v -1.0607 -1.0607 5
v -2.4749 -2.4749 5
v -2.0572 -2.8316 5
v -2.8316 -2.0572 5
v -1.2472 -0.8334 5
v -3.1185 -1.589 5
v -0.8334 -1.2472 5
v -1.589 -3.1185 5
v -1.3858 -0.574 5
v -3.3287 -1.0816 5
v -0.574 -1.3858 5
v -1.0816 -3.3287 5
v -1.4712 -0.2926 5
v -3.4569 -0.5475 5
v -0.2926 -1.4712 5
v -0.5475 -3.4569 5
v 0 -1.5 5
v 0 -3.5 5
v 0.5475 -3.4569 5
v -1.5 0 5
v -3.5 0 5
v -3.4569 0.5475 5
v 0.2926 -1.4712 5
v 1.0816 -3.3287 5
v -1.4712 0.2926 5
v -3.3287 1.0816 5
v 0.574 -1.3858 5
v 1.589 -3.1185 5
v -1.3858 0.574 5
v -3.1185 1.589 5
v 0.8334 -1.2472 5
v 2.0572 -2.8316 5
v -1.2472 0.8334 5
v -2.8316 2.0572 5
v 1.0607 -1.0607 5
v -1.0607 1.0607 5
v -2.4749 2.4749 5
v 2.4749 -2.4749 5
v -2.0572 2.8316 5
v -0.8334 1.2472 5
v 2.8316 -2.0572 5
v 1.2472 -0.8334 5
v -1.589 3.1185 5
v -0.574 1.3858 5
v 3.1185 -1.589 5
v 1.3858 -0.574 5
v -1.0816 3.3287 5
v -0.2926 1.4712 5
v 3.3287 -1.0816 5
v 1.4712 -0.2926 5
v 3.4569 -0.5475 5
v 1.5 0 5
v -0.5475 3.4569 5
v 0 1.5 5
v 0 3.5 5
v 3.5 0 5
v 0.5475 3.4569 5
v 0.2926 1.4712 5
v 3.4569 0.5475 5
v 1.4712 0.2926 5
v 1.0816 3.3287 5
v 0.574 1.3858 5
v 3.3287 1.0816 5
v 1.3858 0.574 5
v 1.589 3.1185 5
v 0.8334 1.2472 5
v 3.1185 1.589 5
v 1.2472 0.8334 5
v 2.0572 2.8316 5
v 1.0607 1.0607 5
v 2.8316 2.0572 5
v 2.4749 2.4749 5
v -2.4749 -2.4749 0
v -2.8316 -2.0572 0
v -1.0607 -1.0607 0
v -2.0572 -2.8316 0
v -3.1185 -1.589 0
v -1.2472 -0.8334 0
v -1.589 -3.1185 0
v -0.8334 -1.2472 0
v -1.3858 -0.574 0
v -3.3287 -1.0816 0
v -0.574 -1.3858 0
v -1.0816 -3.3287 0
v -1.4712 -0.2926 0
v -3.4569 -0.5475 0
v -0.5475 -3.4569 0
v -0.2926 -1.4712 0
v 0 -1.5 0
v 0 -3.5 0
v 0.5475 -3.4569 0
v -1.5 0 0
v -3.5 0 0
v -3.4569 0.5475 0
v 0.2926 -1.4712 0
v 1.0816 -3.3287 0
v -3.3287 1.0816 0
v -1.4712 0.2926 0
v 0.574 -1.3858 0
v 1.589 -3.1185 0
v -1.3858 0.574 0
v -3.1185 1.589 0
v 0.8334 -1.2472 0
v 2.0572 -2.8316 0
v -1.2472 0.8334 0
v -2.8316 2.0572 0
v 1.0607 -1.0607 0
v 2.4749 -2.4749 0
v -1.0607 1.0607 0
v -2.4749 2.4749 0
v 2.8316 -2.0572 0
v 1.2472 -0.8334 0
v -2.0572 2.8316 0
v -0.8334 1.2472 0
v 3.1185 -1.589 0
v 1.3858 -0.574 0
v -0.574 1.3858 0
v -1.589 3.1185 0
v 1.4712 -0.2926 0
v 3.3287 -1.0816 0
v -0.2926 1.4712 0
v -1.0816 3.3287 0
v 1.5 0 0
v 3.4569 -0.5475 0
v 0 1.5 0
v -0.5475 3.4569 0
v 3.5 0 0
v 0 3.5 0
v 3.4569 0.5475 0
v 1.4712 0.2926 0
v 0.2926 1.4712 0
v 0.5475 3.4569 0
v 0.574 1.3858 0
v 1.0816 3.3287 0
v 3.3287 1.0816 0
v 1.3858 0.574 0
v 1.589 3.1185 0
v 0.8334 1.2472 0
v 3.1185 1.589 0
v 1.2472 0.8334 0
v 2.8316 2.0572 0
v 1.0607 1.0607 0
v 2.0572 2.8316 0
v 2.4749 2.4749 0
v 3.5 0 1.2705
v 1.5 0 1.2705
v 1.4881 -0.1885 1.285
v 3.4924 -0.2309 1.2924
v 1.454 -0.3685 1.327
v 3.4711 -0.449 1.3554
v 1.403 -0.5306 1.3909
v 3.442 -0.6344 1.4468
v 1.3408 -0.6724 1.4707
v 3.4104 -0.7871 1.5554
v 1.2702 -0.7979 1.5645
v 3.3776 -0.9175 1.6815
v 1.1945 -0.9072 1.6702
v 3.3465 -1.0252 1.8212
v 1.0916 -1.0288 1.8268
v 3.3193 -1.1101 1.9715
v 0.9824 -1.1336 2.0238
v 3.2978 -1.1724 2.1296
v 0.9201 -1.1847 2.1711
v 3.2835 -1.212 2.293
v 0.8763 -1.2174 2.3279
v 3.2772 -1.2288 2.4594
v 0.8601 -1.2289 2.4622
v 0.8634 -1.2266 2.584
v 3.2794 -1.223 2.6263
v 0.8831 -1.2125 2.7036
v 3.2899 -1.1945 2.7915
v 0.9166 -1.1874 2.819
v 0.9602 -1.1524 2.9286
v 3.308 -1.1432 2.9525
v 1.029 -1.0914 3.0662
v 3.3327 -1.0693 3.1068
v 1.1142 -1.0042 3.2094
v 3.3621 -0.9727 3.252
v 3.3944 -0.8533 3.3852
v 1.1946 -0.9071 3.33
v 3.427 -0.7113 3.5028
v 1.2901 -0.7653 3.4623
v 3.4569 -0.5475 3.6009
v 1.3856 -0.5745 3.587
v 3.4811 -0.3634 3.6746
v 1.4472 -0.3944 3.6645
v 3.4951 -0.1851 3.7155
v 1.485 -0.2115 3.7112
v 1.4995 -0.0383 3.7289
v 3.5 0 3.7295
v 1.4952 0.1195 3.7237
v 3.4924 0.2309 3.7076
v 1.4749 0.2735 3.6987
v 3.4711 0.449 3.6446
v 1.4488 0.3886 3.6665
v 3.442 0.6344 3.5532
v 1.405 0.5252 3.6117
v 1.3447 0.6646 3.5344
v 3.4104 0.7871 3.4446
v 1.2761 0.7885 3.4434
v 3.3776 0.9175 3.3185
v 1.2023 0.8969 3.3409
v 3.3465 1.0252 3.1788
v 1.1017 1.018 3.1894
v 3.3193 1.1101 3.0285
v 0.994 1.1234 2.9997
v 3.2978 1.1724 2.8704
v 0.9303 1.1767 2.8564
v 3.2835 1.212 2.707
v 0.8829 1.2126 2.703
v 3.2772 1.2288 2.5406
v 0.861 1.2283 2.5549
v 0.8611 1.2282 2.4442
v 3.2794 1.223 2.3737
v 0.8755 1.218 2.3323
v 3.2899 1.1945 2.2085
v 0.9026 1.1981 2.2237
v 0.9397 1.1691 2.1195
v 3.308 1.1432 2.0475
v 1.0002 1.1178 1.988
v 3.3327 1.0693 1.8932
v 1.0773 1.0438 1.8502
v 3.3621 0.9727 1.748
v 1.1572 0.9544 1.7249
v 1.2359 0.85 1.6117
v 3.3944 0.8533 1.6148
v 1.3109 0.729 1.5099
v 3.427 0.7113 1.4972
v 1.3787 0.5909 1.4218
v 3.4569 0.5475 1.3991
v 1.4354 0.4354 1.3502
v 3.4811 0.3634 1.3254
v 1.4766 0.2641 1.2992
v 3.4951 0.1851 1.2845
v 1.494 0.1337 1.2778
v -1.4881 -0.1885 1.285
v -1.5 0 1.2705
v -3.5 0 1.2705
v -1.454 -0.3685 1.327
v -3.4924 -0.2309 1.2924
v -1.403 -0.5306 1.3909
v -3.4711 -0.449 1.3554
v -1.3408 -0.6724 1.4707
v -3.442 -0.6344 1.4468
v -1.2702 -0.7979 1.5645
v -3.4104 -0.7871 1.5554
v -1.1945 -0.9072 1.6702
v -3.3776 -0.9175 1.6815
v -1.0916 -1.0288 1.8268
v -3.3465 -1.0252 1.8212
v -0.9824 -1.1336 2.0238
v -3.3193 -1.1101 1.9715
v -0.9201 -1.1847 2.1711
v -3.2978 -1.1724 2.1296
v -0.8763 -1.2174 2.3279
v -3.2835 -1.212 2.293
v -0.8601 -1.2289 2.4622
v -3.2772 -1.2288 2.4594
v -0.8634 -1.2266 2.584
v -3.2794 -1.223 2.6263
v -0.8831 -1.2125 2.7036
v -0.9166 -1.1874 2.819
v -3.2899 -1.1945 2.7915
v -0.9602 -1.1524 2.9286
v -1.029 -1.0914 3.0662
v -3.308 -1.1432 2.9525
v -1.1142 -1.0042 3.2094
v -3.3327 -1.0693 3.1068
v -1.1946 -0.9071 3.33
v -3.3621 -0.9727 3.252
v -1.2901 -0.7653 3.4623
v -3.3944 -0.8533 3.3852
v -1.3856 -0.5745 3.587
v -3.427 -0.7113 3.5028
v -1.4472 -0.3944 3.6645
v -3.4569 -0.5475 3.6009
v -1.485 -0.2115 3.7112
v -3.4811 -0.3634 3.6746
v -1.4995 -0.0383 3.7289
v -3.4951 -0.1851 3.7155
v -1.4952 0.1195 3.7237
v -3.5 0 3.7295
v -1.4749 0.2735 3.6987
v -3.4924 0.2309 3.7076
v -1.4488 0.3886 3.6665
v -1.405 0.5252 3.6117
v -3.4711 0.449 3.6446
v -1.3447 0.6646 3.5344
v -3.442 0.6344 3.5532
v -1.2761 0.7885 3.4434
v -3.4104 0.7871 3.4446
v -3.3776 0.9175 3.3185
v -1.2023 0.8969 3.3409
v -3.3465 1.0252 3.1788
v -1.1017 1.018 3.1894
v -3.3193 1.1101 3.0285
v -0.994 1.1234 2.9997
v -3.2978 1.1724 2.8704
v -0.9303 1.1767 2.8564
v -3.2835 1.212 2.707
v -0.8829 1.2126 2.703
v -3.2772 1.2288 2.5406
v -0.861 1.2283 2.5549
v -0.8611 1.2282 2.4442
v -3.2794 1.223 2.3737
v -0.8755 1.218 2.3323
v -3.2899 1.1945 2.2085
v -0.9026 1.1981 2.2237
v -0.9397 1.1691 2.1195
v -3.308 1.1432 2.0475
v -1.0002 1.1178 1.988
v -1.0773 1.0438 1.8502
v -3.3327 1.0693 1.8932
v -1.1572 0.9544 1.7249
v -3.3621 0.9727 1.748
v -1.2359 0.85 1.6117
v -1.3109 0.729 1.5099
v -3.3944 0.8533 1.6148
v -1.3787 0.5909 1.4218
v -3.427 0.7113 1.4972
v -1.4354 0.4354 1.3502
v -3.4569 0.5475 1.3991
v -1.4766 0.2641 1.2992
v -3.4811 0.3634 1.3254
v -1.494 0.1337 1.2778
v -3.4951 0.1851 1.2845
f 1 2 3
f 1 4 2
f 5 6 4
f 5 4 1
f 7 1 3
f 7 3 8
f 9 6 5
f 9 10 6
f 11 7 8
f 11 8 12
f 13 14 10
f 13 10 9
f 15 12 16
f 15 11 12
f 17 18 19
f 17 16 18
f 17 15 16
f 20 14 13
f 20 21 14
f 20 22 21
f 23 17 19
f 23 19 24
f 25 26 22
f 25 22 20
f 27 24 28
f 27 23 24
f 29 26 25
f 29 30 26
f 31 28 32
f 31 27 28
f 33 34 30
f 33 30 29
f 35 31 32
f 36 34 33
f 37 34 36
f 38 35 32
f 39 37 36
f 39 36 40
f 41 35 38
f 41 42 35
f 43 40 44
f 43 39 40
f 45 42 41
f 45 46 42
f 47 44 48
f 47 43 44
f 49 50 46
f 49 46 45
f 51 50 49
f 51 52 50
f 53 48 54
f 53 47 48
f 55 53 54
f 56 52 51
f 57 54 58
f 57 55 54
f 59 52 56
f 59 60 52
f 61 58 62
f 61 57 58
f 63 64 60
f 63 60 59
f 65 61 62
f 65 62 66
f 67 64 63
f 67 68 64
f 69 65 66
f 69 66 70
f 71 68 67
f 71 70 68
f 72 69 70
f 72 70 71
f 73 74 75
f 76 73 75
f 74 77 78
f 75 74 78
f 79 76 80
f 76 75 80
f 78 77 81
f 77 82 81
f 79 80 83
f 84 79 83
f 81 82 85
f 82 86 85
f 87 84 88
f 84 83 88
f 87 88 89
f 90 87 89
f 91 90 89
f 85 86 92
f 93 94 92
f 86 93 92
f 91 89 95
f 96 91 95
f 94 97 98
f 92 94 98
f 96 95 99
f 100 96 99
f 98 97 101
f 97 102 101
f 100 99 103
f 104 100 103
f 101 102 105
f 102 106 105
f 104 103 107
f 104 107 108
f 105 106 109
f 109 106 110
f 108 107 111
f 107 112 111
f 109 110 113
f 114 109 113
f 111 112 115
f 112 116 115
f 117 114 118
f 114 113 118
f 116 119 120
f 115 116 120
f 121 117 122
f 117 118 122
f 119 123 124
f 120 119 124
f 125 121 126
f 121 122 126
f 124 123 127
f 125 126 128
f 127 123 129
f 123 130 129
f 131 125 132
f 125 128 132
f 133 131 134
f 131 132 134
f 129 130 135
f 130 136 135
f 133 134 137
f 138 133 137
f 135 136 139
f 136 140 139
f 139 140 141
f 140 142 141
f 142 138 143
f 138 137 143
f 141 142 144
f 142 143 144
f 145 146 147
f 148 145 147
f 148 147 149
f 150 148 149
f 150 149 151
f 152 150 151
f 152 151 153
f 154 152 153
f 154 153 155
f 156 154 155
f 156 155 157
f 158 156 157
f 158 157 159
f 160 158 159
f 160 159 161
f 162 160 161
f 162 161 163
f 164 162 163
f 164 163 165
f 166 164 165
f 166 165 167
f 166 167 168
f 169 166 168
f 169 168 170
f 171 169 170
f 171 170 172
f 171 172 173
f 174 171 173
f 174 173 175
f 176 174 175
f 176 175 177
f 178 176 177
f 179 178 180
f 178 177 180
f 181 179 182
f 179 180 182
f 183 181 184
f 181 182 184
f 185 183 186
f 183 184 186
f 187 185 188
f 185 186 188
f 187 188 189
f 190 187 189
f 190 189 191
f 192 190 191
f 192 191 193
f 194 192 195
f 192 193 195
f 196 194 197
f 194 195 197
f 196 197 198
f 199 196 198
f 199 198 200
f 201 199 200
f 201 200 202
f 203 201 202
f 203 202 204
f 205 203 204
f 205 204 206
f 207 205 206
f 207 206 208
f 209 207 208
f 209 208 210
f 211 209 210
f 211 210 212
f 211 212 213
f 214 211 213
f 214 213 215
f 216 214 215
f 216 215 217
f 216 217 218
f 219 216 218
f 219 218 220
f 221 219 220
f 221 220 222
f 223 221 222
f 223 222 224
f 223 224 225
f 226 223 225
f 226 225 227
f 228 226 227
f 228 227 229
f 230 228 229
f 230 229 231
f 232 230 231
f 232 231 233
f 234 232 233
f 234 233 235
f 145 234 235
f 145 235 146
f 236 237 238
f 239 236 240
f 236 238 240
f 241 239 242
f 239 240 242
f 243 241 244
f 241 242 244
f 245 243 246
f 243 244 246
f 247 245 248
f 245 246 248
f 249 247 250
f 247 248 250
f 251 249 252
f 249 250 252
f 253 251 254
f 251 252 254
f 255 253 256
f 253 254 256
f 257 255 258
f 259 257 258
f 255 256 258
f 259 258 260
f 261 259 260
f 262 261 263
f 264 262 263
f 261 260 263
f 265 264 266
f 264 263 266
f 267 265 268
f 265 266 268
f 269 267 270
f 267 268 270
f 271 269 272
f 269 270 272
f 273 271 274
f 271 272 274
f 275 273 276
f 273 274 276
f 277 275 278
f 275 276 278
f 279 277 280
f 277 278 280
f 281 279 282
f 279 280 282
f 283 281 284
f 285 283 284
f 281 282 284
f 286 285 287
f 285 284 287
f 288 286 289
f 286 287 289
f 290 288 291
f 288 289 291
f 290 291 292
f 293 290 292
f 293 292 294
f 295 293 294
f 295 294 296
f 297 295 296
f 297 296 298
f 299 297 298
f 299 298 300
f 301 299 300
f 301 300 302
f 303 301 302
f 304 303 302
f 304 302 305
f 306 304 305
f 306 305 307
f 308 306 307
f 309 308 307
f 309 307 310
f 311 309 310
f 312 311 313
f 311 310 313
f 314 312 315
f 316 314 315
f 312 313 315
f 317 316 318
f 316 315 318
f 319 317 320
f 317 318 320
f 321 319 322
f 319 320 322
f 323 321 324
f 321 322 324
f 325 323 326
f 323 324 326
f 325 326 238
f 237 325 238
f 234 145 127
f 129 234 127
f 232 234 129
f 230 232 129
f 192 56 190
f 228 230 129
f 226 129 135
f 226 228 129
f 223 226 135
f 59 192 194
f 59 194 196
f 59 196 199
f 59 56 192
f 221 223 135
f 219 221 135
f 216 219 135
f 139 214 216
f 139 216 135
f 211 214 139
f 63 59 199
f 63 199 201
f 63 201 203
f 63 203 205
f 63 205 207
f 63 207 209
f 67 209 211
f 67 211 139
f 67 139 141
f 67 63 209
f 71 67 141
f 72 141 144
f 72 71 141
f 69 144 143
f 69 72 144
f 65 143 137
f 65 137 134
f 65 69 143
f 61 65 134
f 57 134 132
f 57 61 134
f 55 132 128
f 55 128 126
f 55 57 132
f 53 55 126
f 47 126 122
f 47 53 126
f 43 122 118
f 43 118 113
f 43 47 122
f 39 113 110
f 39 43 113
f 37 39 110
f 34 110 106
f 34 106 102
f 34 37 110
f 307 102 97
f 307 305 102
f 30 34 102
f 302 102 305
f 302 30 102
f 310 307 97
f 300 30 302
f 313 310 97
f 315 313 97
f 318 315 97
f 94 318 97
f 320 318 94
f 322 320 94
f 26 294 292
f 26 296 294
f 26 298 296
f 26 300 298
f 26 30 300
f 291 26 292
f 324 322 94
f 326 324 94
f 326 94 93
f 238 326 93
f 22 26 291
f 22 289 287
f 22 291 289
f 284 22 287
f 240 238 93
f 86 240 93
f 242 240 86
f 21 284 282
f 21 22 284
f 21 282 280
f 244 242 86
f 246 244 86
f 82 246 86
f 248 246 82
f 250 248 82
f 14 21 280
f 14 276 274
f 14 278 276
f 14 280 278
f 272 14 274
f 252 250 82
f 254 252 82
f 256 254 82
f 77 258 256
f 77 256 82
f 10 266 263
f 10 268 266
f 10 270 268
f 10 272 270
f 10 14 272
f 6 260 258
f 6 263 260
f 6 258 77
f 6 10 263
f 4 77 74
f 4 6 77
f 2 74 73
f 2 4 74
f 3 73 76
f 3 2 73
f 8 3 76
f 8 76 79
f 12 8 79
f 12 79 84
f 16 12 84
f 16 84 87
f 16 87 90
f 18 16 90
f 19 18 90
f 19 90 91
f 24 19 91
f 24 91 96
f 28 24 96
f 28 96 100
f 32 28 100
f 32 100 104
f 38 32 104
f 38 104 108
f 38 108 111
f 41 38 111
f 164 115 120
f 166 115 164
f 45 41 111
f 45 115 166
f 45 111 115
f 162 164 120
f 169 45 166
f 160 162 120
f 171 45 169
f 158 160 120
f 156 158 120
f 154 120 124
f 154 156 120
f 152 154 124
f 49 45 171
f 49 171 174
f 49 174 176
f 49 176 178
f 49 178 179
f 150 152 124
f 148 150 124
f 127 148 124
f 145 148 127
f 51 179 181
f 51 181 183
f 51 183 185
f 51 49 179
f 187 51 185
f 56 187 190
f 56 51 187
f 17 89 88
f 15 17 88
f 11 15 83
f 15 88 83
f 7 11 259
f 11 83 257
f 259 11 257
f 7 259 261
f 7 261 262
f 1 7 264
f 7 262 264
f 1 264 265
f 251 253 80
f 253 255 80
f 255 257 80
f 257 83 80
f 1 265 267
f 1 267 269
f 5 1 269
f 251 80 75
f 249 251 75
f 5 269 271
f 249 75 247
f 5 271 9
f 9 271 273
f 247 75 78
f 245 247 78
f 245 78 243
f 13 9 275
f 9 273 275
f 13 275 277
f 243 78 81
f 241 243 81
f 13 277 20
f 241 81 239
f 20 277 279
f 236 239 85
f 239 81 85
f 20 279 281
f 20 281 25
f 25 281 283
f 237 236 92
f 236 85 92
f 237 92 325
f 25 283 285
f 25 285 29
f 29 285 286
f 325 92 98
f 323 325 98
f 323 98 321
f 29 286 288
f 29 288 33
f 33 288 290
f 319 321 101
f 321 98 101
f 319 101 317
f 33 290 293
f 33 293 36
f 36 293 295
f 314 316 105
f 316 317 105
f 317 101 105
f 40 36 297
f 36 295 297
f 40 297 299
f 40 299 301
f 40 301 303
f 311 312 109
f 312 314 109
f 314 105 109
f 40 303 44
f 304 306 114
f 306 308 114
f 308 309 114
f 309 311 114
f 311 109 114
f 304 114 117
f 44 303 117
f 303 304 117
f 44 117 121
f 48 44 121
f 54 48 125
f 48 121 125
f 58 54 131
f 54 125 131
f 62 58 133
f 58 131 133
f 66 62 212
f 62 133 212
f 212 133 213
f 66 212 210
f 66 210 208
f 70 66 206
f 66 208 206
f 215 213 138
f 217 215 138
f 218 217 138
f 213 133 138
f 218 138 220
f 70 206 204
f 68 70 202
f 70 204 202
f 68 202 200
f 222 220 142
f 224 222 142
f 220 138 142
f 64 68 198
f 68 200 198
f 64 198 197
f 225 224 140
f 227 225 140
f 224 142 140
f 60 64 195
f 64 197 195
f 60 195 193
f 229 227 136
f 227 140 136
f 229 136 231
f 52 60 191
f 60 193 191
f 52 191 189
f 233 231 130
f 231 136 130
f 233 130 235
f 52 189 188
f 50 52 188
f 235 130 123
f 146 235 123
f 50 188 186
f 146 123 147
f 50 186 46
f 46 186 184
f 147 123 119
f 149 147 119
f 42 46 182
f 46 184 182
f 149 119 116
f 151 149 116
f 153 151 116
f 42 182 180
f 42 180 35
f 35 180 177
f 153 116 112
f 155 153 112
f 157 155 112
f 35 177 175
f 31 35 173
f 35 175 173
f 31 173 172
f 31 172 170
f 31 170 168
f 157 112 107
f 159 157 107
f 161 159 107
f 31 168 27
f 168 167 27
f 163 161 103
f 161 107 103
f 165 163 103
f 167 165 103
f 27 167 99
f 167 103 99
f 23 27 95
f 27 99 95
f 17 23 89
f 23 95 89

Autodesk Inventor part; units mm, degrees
ref_plane "YZ Plane" through (0, 0, 0) normal (1, 0, 0) x (0, 1, 0)
ref_plane "XZ Plane" through (0, 0, 0) normal (0, 1, 0) x (-1, 0, 0)
ref_plane "XY Plane" through (0, 0, 0) normal (0, 0, 1) x (1, 0, 0)
sketch "スケッチ1" plane through (0, 0, 0) normal (0, 0, 1) x (1, 0, 0)
  line L0 (-3.5, 3.5) -> (3.5, 3.5)
  line L1 (3.5, 3.5) -> (3.5, -3.5)
  line L2 (3.5, -3.5) -> (-3.5, -3.5)
  line L3 (-3.5, -3.5) -> (-3.5, 3.5)
  line L4 (-3.5, 3.5) -> (3.5, -3.5) construction
  line L5 (3.5, 3.5) -> (-3.5, -3.5) construction
  point P0 (0, 0)
  dimension "d0" = 7
  dimension "d2" = 7
extrude "押し出し1" add sketch "スケッチ1" along normal blind 5
sketch "スケッチ2" plane through (3.5, -3.5, 0) normal (1, 0, 0) x (0, 0, -1)
  line L0 (-5, 0) -> (-5, 7) projected
  line L1 (0, 0) -> (-5, 0) projected
  point P0 (0, 3.5)
  point P1 (-2.5, 3.5)
  dimension "d5" = 2.5
  dimension "d6" = 3.5
hole "穴1" at (3.5, 0, 2.5) direction (-1, 0, 0) diameter 2.459 end through all thread size "M3x0.5" class "6H" standard "ANSI Metric M Profile"
sketch "スケッチ3" plane through (0, 0, 5) normal (0, 0, 1) x (1, 0, 0)
  line L0 (3.5, 3.5) -> (-3.5, 3.5) projected
  line L1 (-3.5, 3.5) -> (-3.5, -3.5) projected
  line L2 (-3.5, -3.5) -> (3.5, -3.5) projected
  line L3 (3.5, -3.5) -> (3.5, 3.5) projected
  circle A0 centre (0, 0) radius 3.5
  point P0 (0, 0)
extrude "押し出し2" cut sketch "スケッチ3" against normal blind 5 contours L3 A0 L0 | A0 L1 L0 | L3 L2 A0 | A0 L2 L1
sketch "スケッチ4" plane through (0, 0, 5) normal (0, 0, 1) x (1, 0, 0)
  circle A0 centre (0, 0) radius 3.5 projected
  circle A1 centre (0, 0) radius 1.5
  dimension "d16" = 3
hole "穴2" at (0, 0, 5) at (0, 0, 5) direction (0, 0, -1) diameter 3 end through all
properties part number "sttopa" material "アルミニウム 2014-T4"
